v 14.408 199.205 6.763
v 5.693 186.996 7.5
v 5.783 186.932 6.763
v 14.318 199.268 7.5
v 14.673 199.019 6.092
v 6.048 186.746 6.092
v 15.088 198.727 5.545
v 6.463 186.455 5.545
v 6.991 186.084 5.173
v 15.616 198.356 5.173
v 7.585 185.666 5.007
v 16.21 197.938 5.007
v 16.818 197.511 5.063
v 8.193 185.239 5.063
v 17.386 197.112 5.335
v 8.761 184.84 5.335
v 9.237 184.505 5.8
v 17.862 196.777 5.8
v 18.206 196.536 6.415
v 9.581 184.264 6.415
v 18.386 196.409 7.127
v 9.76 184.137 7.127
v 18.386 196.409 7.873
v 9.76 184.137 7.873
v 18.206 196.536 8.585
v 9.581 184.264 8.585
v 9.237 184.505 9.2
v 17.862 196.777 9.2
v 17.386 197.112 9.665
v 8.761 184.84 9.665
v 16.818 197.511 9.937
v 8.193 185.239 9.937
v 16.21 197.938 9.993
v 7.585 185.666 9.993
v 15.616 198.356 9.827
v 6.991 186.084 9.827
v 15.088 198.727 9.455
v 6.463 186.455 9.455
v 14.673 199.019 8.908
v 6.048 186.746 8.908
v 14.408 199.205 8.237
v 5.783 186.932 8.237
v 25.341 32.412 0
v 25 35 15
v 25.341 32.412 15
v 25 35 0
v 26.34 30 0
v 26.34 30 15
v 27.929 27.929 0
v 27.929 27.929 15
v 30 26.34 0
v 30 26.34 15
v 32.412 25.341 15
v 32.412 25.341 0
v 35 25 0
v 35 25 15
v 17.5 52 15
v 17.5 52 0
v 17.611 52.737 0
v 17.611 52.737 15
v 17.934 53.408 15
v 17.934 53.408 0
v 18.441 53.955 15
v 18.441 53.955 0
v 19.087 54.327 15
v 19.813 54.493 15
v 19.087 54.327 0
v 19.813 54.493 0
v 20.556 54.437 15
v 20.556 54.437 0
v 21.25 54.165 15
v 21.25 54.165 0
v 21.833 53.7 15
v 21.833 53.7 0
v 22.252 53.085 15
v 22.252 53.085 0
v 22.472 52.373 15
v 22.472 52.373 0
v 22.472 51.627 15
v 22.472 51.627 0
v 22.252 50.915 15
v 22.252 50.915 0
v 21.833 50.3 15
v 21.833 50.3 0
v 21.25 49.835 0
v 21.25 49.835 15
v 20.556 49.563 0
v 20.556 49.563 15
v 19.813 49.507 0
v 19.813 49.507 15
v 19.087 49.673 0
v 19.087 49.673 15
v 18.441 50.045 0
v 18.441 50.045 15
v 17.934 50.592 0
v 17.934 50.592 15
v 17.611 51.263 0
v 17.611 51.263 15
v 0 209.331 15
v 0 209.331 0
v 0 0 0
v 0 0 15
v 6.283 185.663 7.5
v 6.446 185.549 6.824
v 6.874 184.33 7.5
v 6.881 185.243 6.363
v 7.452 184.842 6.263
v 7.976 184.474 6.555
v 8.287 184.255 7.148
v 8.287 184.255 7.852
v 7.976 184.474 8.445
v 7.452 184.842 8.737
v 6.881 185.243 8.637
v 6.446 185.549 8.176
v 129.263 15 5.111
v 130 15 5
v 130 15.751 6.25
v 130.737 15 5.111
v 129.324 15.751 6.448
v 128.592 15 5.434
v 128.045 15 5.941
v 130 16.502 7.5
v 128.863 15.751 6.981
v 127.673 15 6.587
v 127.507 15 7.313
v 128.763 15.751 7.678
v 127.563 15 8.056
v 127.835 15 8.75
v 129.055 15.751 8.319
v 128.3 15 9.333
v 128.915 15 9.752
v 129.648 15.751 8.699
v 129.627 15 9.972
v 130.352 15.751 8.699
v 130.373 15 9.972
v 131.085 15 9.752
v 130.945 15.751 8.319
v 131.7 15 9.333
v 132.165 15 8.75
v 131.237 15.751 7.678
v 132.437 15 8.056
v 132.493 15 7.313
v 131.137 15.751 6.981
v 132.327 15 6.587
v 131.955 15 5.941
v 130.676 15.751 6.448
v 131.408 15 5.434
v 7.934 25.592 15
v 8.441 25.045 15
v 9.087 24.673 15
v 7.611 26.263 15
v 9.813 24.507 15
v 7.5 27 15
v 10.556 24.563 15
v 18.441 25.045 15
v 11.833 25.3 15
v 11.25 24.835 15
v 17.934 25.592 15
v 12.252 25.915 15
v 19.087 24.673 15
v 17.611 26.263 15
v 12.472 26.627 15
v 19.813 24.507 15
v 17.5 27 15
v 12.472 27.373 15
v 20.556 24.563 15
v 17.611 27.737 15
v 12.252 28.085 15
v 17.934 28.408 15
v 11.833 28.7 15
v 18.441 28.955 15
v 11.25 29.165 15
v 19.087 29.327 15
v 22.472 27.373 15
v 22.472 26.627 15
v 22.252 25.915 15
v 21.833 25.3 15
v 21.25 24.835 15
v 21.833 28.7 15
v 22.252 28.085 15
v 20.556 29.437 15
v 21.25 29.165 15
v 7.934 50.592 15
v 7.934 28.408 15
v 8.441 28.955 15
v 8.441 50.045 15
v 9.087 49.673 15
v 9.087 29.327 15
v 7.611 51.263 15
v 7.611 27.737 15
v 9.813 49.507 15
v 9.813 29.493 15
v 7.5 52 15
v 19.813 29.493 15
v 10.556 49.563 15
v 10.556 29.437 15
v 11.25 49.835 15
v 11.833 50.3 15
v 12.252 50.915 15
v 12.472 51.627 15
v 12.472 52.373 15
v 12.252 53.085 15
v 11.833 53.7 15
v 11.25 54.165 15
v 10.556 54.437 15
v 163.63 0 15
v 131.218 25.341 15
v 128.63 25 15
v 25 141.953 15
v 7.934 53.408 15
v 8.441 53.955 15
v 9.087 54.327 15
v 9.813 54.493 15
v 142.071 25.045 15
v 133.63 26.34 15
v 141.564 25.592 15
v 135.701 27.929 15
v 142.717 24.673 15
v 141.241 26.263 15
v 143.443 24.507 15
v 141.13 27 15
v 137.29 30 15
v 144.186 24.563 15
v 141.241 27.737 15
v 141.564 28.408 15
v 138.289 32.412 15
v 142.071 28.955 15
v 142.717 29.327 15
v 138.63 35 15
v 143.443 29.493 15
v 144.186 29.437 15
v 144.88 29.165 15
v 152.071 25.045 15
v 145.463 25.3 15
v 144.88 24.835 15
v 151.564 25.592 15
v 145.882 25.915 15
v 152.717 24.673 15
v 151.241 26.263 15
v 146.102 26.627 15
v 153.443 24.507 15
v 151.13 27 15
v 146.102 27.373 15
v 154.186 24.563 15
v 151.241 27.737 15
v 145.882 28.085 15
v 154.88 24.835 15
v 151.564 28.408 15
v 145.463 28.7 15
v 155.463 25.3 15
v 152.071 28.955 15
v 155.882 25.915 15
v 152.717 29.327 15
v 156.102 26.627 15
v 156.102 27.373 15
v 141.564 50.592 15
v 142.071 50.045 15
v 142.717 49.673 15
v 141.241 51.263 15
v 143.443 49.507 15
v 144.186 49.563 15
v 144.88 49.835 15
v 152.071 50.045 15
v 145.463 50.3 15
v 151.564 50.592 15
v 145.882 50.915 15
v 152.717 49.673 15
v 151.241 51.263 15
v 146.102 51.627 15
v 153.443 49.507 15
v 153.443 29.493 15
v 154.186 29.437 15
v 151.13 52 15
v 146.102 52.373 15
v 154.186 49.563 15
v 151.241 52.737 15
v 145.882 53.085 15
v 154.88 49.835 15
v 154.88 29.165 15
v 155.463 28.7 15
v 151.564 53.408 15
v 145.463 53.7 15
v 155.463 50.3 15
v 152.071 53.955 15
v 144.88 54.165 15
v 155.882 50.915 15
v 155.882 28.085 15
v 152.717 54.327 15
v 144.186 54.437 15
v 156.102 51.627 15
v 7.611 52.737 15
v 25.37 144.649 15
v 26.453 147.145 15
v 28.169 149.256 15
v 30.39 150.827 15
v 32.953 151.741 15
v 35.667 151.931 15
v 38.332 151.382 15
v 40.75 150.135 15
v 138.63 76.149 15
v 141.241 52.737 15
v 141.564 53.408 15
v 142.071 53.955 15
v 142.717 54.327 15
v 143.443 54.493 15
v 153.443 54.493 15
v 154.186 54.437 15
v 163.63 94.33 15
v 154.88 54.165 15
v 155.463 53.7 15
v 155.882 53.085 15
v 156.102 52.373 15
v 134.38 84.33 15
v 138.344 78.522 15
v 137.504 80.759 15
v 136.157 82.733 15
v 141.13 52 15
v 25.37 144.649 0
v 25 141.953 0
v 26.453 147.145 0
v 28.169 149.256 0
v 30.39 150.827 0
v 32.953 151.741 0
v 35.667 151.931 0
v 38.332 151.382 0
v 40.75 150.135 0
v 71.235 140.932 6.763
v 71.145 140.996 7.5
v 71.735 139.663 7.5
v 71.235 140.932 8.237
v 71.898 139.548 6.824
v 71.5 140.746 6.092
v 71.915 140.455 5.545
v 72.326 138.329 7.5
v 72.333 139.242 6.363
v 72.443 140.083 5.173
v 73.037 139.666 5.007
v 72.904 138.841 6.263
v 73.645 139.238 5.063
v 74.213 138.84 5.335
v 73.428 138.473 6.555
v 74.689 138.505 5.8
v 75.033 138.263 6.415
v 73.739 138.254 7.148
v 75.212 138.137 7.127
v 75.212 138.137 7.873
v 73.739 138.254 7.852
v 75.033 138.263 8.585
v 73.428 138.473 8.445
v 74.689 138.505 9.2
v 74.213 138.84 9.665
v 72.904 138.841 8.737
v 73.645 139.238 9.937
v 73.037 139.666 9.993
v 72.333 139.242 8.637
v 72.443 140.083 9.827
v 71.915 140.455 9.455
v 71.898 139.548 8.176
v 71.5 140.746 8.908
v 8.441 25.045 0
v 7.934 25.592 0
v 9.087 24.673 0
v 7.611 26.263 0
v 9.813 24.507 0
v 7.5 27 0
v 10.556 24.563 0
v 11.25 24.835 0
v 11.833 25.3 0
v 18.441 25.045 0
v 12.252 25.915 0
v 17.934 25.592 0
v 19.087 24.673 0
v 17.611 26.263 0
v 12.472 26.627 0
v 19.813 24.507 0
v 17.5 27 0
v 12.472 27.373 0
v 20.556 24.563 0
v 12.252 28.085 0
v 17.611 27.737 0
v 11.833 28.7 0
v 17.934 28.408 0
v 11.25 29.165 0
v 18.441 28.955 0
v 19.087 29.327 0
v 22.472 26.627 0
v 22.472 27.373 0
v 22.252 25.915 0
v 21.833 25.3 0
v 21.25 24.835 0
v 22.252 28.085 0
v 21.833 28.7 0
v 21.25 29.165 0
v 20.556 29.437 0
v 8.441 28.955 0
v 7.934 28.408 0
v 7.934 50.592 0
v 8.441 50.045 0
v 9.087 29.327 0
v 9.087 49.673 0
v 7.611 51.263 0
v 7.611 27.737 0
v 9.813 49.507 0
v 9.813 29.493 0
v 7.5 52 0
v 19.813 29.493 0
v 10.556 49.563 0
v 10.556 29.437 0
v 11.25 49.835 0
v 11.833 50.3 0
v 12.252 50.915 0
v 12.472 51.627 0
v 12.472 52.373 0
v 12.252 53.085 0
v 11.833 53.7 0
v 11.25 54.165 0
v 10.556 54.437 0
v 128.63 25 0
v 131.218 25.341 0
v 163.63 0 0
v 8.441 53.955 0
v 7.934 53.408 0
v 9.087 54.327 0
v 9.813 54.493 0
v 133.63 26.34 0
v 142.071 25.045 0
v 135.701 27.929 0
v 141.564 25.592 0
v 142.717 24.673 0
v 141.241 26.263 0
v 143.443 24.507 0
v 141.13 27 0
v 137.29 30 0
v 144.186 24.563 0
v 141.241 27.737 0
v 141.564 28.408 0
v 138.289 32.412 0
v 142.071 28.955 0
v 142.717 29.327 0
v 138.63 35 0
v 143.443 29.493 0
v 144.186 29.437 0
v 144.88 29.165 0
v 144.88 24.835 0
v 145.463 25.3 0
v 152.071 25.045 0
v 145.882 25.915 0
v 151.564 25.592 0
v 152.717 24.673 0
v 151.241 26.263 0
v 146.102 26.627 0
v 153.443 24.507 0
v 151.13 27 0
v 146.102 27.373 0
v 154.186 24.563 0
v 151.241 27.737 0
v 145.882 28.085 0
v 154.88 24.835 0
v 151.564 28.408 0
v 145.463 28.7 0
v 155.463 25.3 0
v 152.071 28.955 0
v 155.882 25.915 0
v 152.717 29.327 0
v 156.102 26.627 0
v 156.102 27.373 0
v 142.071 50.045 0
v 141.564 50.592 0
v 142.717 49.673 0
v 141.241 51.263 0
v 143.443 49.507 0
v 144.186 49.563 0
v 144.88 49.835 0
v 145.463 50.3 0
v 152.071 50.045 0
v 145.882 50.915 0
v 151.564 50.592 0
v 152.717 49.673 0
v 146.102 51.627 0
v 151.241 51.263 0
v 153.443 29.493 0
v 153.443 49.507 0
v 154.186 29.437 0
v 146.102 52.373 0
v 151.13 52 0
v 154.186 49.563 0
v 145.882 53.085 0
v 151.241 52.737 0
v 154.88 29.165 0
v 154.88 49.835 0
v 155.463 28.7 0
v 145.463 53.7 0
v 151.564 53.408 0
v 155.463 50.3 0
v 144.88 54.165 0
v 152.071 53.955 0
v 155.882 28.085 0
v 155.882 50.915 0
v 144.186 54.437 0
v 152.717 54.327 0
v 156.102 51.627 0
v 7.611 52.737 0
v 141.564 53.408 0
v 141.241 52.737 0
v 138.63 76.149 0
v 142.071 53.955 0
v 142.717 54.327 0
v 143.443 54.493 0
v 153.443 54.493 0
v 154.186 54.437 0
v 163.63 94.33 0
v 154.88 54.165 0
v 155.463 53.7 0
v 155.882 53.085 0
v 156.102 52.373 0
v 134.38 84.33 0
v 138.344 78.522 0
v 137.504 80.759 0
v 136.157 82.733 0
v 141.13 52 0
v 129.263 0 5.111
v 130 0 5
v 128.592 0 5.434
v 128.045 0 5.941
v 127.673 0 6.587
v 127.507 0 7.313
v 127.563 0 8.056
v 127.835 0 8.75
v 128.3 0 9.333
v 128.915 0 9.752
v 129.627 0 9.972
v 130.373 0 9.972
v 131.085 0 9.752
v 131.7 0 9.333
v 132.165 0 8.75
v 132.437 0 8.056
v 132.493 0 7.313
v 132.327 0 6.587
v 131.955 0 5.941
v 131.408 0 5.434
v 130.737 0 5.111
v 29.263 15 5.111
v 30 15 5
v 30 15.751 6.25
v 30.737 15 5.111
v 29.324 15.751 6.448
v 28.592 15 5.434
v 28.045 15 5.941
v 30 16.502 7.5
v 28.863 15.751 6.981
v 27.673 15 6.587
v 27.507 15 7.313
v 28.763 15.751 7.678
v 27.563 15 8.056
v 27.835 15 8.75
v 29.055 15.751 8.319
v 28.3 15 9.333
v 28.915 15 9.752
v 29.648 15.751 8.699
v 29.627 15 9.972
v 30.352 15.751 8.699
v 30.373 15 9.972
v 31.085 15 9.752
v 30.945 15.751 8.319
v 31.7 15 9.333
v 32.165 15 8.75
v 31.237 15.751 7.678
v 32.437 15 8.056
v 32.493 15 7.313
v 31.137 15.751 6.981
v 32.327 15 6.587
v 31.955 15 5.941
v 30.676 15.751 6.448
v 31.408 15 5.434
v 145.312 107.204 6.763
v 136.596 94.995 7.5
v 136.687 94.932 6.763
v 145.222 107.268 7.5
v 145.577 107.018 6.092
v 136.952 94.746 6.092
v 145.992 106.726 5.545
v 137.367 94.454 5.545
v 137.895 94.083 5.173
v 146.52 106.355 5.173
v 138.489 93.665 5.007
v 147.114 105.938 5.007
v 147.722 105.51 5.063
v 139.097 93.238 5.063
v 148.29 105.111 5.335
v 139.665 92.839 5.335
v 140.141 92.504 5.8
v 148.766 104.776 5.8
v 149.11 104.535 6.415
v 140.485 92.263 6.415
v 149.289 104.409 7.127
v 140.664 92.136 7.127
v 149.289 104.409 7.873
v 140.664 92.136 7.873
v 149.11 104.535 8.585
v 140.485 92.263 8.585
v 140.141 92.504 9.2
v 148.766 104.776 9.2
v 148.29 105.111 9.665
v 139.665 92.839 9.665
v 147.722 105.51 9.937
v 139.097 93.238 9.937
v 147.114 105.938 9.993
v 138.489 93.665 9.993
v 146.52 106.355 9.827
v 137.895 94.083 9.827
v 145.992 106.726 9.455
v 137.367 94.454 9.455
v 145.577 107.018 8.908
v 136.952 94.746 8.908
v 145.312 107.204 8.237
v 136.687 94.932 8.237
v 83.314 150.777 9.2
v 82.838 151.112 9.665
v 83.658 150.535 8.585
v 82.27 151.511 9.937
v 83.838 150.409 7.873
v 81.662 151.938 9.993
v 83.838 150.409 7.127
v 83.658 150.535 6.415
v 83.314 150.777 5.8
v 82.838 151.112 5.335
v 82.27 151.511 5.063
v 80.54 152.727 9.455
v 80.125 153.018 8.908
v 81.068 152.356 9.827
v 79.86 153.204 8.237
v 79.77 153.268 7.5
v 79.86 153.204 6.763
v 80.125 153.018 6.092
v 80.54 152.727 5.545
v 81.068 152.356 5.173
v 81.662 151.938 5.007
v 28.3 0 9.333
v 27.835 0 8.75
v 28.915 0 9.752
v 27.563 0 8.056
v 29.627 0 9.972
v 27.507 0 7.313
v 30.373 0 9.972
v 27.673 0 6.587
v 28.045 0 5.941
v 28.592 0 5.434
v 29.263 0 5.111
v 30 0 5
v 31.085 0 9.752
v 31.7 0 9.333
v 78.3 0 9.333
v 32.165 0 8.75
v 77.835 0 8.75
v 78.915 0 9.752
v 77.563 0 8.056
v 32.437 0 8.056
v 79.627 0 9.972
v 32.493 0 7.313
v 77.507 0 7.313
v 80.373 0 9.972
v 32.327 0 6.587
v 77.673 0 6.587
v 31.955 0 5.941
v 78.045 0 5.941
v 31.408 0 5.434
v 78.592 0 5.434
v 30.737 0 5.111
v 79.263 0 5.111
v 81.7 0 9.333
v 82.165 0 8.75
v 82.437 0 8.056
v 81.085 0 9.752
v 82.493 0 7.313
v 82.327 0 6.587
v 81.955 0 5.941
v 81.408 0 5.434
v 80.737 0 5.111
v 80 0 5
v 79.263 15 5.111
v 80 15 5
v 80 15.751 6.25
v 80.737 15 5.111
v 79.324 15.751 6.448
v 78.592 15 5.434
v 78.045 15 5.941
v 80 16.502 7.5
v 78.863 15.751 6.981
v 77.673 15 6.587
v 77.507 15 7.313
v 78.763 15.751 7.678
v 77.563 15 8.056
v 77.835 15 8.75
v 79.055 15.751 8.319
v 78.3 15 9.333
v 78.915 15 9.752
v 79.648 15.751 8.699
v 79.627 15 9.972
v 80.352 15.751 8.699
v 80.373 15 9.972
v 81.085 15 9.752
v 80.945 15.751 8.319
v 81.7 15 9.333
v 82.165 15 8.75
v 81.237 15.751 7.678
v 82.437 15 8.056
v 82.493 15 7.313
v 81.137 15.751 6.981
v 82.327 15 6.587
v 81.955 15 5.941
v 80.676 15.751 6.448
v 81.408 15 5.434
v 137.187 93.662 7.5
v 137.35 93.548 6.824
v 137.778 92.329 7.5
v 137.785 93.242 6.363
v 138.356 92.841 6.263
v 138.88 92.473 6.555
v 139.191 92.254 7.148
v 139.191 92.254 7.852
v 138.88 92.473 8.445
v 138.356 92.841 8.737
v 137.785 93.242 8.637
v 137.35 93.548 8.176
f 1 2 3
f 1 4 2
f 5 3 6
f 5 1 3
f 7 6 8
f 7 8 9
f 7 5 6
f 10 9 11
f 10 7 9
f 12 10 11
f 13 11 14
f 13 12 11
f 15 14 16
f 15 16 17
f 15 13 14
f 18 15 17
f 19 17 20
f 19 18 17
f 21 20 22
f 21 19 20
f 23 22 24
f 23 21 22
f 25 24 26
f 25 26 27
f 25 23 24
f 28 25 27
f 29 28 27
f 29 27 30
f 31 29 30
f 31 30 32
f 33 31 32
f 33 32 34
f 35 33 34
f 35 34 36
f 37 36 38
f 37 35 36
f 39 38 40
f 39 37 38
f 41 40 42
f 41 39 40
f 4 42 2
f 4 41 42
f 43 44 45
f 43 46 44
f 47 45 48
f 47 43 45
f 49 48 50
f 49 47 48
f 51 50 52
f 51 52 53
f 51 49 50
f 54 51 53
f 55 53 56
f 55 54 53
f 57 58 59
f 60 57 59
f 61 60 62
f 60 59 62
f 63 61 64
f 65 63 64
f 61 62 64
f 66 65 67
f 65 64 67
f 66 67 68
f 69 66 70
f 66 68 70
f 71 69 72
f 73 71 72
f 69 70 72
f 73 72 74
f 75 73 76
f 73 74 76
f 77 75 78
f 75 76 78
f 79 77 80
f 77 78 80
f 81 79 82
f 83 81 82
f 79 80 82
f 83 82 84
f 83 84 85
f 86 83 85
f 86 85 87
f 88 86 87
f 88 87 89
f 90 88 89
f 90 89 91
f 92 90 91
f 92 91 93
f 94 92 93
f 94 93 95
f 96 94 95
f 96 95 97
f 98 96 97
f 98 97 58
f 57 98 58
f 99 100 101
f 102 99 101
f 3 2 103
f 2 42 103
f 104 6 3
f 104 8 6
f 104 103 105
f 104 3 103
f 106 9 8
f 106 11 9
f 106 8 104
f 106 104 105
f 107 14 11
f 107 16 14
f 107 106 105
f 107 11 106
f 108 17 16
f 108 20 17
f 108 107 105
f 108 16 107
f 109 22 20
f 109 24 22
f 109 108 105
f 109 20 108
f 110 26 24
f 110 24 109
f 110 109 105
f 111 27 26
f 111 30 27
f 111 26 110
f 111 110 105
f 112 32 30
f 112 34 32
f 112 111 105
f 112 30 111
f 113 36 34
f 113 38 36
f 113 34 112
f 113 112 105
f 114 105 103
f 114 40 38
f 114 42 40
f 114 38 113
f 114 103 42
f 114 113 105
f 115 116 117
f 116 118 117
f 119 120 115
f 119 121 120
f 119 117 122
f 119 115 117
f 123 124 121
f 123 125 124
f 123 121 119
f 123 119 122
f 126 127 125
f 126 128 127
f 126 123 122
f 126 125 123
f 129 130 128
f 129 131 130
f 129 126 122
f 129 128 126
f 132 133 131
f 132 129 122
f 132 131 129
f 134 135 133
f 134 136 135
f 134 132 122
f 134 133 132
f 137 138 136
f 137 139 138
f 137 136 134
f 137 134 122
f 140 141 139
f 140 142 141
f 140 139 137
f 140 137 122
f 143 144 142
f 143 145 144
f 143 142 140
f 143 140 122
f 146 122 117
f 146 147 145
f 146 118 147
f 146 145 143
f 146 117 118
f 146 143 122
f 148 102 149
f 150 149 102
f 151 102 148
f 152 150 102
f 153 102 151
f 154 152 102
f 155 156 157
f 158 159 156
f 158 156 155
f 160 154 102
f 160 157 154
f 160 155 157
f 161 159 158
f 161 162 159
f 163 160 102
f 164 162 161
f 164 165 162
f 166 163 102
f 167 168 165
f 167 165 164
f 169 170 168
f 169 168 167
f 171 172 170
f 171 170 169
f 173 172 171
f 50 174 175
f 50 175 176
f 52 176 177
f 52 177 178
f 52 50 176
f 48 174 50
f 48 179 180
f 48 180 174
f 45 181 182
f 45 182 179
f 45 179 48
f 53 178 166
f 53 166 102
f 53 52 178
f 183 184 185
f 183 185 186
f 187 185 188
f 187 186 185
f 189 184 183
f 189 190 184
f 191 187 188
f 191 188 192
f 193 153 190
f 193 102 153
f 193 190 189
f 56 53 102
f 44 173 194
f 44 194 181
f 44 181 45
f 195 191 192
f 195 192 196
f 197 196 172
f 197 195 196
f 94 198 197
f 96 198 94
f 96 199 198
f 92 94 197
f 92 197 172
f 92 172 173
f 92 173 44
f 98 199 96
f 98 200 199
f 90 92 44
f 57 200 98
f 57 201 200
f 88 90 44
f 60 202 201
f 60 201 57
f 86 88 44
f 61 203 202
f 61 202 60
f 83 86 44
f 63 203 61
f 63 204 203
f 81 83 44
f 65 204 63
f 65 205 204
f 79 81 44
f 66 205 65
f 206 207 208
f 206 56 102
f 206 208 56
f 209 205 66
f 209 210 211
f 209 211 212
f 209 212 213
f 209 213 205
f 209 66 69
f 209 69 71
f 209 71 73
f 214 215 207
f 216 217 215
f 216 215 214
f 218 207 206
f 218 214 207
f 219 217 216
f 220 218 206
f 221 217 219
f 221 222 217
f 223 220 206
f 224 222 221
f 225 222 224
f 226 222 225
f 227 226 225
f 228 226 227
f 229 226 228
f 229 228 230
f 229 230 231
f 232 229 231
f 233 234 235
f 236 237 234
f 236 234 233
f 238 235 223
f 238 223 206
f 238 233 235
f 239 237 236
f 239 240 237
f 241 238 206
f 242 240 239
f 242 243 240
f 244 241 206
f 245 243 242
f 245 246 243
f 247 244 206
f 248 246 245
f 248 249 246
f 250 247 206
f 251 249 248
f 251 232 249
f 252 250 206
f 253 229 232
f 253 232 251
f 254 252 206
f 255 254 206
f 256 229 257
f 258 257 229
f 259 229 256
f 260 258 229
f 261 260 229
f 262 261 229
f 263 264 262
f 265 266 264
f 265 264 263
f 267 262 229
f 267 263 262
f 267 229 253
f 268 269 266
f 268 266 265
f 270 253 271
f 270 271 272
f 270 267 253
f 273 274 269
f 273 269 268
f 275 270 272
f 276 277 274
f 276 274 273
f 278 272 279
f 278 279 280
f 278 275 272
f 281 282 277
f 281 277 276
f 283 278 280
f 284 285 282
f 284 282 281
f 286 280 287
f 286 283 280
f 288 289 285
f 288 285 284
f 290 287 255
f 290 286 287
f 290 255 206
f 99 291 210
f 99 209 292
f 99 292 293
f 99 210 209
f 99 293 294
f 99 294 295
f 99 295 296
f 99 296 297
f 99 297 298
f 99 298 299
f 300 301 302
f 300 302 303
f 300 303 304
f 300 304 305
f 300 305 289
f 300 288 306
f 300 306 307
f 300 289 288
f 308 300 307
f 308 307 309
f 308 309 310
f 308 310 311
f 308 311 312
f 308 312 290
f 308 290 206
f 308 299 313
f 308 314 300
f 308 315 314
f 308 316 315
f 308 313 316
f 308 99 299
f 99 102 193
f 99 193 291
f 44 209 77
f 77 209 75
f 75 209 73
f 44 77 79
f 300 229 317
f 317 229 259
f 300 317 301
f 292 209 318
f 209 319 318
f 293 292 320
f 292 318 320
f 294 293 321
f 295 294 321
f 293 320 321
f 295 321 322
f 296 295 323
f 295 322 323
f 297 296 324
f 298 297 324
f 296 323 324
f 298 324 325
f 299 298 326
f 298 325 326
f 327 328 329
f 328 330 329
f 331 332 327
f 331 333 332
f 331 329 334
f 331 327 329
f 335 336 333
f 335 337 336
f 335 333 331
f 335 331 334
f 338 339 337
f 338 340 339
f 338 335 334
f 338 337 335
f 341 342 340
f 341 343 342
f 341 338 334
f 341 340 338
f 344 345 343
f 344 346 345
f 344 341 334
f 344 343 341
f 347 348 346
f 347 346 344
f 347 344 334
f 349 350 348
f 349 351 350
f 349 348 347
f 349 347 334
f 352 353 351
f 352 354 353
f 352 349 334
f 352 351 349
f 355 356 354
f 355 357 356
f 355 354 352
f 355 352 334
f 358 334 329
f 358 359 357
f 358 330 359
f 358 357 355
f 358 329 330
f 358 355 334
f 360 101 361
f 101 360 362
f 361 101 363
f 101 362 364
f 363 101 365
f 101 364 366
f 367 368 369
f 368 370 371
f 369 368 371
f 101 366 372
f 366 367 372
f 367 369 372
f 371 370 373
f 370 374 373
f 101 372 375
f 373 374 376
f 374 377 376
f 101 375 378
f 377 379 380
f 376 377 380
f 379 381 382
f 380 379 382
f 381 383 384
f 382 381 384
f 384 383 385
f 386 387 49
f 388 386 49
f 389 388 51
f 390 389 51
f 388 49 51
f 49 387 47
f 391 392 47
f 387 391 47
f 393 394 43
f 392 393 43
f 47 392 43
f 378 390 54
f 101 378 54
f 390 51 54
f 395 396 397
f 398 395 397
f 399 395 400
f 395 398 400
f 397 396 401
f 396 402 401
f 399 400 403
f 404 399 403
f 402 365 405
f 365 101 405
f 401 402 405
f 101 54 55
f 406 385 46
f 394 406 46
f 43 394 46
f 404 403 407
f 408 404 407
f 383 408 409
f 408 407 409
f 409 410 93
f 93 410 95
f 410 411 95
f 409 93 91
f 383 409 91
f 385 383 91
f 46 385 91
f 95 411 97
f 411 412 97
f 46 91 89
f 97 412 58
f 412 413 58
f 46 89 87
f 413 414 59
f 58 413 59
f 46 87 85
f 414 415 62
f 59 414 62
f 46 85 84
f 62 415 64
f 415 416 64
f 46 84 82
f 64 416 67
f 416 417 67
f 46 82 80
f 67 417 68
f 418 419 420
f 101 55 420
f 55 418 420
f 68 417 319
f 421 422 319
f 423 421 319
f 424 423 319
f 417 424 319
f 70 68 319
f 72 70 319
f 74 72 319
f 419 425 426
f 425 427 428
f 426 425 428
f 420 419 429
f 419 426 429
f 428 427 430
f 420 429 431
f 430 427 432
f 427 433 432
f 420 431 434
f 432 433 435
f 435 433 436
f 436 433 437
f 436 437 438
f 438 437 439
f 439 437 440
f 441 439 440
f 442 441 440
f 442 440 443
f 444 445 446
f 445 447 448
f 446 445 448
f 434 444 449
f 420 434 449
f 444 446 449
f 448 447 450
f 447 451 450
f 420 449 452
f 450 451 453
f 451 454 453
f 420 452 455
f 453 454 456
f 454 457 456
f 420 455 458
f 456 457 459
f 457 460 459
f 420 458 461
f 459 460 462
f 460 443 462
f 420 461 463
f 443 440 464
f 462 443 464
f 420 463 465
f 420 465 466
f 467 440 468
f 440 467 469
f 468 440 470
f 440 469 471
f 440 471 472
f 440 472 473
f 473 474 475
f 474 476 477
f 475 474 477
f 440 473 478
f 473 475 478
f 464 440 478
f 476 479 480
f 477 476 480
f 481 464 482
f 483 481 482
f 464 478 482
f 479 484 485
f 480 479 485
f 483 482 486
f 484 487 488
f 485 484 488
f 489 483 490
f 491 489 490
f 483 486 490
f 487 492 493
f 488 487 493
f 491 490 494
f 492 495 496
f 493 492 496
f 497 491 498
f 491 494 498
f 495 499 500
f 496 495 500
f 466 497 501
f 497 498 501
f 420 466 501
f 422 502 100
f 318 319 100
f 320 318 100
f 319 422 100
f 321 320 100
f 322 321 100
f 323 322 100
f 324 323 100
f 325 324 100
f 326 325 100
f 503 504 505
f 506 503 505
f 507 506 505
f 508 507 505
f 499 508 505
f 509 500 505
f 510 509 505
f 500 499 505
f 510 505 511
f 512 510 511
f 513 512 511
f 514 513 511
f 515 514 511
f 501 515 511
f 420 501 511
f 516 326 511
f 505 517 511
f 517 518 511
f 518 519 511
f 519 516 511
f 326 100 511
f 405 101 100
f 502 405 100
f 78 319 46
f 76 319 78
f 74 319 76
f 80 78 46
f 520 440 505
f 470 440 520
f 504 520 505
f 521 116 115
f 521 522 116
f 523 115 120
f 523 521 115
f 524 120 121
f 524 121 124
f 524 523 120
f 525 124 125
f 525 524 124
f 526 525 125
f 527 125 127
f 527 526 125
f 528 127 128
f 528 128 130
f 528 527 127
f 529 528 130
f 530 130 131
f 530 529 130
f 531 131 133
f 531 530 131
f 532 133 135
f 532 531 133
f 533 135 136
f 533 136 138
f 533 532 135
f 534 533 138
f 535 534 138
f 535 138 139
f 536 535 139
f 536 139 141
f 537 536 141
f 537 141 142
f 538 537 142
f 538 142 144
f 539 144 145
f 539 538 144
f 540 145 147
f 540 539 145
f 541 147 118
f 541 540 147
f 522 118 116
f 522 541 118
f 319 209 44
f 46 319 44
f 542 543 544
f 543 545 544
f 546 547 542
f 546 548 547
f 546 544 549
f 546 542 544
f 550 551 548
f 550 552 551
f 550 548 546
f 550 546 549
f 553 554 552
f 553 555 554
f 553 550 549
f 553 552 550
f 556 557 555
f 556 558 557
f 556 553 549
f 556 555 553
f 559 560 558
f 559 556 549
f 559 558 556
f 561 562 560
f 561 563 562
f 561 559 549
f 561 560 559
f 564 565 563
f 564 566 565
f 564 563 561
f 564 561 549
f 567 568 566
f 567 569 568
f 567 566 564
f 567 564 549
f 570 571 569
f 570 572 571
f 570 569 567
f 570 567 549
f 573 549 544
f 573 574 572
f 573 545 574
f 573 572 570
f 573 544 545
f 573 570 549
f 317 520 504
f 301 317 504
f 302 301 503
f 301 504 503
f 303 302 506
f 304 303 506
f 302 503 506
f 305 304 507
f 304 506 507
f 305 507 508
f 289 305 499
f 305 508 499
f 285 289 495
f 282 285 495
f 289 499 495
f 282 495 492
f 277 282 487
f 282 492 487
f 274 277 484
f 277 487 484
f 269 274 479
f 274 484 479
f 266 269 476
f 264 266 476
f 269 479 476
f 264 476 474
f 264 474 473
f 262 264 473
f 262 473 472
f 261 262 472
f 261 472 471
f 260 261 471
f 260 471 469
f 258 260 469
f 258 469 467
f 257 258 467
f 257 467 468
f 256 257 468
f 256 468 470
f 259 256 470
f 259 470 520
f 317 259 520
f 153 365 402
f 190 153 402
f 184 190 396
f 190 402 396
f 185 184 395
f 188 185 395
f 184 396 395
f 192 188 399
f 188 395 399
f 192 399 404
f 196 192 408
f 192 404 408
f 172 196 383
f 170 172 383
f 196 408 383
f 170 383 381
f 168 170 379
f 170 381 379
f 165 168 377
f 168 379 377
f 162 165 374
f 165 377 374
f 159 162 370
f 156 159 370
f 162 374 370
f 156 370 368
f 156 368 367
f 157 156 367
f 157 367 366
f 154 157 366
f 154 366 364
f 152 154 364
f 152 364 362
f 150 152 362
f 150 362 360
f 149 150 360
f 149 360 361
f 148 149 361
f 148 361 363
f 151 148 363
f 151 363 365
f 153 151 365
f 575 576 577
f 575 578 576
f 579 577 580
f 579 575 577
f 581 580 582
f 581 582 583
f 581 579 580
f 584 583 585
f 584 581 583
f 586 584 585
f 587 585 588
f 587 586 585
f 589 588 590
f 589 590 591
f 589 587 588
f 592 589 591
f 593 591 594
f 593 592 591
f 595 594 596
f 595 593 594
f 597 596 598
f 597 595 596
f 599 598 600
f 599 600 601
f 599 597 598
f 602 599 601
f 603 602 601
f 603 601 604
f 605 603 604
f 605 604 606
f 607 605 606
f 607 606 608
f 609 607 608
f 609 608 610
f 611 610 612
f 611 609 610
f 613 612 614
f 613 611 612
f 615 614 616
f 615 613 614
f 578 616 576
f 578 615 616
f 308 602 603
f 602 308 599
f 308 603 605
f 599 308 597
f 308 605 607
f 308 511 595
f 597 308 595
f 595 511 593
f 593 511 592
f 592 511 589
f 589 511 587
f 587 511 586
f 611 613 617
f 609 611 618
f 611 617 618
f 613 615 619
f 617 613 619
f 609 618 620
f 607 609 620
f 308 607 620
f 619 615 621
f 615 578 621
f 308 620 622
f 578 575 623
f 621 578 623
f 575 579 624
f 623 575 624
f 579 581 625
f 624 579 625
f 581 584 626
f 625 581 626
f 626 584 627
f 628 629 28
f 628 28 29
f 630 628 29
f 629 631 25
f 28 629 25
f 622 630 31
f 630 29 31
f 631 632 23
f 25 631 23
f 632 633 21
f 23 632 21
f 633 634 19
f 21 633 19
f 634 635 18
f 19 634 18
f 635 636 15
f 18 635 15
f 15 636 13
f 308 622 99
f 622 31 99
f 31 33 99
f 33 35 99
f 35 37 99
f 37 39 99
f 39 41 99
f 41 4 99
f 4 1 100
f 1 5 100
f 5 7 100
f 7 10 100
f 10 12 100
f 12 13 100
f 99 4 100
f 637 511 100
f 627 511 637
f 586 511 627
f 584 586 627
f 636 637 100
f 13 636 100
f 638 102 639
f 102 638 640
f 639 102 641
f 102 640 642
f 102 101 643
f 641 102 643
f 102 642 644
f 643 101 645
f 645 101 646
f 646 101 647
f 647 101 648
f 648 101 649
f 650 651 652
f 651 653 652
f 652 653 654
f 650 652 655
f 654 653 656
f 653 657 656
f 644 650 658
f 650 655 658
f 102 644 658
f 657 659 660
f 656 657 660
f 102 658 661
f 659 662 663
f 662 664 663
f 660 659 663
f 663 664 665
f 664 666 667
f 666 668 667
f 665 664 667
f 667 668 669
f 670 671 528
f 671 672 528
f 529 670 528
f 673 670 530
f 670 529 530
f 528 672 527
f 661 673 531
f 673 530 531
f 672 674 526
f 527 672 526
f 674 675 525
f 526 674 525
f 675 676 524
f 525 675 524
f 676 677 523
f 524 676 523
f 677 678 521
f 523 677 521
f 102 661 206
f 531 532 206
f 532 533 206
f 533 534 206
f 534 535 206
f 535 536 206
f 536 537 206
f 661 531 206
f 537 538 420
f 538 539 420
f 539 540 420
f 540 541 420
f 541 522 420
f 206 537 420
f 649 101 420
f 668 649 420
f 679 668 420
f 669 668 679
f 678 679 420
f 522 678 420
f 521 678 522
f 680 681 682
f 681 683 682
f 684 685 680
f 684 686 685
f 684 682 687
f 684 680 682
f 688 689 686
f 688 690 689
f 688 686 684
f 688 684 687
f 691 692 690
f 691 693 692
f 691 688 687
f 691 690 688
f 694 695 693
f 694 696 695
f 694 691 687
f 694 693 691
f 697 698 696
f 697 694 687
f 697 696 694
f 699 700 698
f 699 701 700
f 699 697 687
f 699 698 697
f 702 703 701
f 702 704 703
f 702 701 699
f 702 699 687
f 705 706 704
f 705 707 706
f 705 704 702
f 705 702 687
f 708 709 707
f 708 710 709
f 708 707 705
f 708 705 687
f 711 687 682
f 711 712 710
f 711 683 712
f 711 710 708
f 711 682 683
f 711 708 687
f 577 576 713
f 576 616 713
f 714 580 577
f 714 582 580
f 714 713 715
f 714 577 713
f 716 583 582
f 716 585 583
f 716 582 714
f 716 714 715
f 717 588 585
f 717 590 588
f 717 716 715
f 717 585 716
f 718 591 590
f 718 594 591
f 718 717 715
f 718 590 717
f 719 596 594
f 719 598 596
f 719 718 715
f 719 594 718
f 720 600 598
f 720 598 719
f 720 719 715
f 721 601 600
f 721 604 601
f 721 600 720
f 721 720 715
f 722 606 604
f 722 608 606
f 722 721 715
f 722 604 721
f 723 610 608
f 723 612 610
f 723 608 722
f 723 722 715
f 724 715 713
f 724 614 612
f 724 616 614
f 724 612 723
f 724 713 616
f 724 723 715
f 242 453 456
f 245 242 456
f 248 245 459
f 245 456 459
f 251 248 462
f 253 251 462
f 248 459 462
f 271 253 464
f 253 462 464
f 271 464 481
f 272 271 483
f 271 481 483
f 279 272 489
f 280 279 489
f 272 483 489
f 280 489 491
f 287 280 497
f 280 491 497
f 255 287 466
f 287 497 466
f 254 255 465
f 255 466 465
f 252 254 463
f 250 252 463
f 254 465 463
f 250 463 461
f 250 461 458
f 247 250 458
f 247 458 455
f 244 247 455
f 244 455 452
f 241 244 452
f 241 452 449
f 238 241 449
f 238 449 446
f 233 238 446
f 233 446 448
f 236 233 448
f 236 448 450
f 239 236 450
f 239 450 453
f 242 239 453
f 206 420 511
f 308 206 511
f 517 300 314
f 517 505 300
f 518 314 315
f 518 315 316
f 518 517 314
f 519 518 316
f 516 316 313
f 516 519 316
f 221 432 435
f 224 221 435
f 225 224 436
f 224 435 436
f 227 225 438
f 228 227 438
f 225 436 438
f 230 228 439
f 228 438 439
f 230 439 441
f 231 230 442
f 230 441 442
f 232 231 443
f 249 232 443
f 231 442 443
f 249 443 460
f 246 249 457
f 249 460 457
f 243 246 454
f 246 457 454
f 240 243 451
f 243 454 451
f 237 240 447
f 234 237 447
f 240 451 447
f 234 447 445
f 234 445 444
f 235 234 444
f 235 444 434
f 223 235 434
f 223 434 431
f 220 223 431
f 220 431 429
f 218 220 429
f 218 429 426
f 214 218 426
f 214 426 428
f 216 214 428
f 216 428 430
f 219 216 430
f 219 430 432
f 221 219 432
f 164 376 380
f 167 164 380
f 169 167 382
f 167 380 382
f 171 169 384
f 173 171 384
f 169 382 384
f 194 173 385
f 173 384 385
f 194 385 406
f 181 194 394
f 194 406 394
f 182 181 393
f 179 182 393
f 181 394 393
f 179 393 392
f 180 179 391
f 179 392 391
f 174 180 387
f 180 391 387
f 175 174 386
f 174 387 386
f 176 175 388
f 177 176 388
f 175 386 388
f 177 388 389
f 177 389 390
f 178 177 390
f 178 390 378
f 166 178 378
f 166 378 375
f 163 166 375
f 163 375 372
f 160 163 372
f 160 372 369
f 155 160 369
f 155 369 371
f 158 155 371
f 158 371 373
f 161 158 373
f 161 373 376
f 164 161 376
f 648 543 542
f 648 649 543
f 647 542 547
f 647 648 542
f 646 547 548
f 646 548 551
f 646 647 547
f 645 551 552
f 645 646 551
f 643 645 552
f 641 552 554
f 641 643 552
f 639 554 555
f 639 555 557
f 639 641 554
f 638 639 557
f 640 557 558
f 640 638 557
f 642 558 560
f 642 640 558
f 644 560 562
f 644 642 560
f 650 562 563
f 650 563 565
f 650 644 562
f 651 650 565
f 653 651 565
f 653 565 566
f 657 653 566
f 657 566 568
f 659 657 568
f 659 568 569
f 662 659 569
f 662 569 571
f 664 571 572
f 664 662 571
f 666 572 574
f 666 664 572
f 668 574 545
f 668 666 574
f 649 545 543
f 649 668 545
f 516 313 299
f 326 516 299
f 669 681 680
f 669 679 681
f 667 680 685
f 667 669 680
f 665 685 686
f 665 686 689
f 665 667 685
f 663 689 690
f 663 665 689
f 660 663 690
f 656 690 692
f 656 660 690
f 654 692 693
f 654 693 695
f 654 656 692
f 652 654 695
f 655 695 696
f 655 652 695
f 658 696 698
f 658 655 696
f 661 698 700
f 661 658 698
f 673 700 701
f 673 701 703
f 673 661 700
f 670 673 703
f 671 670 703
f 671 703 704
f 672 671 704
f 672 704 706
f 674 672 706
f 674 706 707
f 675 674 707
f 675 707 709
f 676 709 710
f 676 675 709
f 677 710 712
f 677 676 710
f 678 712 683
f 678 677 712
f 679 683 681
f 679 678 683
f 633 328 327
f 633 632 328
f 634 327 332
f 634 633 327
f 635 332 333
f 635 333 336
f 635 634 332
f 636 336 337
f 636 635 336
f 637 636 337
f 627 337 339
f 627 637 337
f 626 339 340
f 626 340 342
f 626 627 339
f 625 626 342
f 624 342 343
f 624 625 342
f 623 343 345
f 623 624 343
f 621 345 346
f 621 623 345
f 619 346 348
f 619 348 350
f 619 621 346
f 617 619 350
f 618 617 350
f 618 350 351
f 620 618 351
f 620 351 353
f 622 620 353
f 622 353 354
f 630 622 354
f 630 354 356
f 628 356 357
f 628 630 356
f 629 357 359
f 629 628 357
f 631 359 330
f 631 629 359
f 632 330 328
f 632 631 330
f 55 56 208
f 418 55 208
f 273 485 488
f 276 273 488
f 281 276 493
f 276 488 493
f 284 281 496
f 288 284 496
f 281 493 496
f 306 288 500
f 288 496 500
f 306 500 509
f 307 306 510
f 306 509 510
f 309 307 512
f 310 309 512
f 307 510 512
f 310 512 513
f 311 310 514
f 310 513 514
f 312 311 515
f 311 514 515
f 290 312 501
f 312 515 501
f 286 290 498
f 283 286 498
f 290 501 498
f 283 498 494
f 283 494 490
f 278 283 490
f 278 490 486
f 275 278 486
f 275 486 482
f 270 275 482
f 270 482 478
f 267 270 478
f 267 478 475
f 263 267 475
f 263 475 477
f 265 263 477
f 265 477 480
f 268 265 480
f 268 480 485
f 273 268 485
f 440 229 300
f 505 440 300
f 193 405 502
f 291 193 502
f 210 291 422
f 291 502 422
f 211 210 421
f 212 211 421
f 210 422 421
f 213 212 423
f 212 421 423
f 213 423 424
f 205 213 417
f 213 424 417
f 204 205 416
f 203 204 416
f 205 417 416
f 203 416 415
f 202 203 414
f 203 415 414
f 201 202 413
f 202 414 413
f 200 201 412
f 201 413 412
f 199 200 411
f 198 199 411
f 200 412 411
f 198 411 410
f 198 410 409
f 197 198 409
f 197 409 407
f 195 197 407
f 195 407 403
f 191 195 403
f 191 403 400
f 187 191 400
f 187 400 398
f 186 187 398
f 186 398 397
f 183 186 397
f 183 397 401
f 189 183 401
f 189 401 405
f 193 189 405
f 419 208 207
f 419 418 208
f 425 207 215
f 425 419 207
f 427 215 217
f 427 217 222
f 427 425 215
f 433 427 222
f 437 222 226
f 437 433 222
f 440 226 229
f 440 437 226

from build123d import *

# Parameters (mm, degrees)
EXTRUDE_1_DEPTH        = 15
CUT_EXTRUDE_1_DEPTH    = 267.118858915
FILLET_1_R             = 10
PATTERN_LINEAR_1_COUNT = 3
PATTERN_LINEAR_1_PITCH = 50
PATTERN_LINEAR_2_COUNT = 3
PATTERN_LINEAR_2_PITCH = 80
HOLE_WIZARD_M6_3_D     = 5


with BuildPart() as part:
    # 草图1 → 凸台-拉伸1 (new body)
    with BuildSketch(Plane.XY):
        Polygon((0, 0), (163.629943485, 0), (163.629943485, 94.33), (0, 209.331050409), align=None)
    extrude(amount=EXTRUDE_1_DEPTH)

    # 草图2 → 切除-拉伸1 (cut, through all)
    with BuildSketch(Plane.XY.offset(15)):
        Polygon((25, 161.2040017), (25, 25), (138.629943485, 25), (138.629943485, 81.343539854), align=None)
    extrude(amount=-CUT_EXTRUDE_1_DEPTH, mode=Mode.SUBTRACT)

    # 圆角1
    fillet_1_edges = [part.edges().sort_by_distance(p)[0] for p in [
        (25, 161.2040017, 7.5),
        (138.629943485, 81.343539854, 7.5),
        (138.629943485, 25, 7.5),
        (25, 25, 7.5),
    ]]
    fillet(fillet_1_edges, radius=FILLET_1_R)

    # 草图3 → M6 螺纹孔1 (revolve, cut)
    with BuildSketch(Plane(origin=(30, 0, 7.5), x_dir=(0, 0, -1), z_dir=(1, 0, 0))):
        Polygon((0, 0), (0, 16.502151548), (2.5, 15), (2.5, 0), align=None)
    hole_wizard_m6_1 = revolve(axis=Axis((30, -6.35, 7.5), (0, 1, 0)), mode=Mode.SUBTRACT)

    # 阵列(线性)1: M6 螺纹孔1 ×3
    with Locations(*[(i * PATTERN_LINEAR_1_PITCH, 0, 0) for i in range(1, PATTERN_LINEAR_1_COUNT)]):
        add(hole_wizard_m6_1, mode=Mode.SUBTRACT)

    # 草图5 → M6 螺纹孔2 (revolve, cut)
    with BuildSketch(Plane(origin=(147.266949137, 105.830105041, 7.5), x_dir=(-0.8181497174250246, 0.5750052520432769, 0), z_dir=(0, 0, 1))):
        Polygon((0, 0), (0, 16.502151548), (2.5, 15), (2.5, 0), align=None)
    hole_wizard_m6_2 = revolve(axis=Axis((150.918232487, 111.025355747, 7.5), (-0.5750052520432769, -0.8181497174250246, 0)), mode=Mode.SUBTRACT)

    # 阵列(线性)2: M6 螺纹孔2 ×3
    with Locations(*[Vector(-0.8181497174250245, 0.575005252043277, 0) * (i * PATTERN_LINEAR_2_PITCH) for i in range(1, PATTERN_LINEAR_2_COUNT)]):
        add(hole_wizard_m6_2, mode=Mode.SUBTRACT)

    # M6 螺纹孔3 (through all)
    with Locations(Plane.XY.offset(15)):
        with Locations((20, 27), (20, 52), (10, 52), (10, 27), (143.629943485, 52), (153.629943485, 52), (143.629943485, 27), (153.629943485, 27)):
            Hole(HOLE_WIZARD_M6_3_D / 2)


solid = part.part
